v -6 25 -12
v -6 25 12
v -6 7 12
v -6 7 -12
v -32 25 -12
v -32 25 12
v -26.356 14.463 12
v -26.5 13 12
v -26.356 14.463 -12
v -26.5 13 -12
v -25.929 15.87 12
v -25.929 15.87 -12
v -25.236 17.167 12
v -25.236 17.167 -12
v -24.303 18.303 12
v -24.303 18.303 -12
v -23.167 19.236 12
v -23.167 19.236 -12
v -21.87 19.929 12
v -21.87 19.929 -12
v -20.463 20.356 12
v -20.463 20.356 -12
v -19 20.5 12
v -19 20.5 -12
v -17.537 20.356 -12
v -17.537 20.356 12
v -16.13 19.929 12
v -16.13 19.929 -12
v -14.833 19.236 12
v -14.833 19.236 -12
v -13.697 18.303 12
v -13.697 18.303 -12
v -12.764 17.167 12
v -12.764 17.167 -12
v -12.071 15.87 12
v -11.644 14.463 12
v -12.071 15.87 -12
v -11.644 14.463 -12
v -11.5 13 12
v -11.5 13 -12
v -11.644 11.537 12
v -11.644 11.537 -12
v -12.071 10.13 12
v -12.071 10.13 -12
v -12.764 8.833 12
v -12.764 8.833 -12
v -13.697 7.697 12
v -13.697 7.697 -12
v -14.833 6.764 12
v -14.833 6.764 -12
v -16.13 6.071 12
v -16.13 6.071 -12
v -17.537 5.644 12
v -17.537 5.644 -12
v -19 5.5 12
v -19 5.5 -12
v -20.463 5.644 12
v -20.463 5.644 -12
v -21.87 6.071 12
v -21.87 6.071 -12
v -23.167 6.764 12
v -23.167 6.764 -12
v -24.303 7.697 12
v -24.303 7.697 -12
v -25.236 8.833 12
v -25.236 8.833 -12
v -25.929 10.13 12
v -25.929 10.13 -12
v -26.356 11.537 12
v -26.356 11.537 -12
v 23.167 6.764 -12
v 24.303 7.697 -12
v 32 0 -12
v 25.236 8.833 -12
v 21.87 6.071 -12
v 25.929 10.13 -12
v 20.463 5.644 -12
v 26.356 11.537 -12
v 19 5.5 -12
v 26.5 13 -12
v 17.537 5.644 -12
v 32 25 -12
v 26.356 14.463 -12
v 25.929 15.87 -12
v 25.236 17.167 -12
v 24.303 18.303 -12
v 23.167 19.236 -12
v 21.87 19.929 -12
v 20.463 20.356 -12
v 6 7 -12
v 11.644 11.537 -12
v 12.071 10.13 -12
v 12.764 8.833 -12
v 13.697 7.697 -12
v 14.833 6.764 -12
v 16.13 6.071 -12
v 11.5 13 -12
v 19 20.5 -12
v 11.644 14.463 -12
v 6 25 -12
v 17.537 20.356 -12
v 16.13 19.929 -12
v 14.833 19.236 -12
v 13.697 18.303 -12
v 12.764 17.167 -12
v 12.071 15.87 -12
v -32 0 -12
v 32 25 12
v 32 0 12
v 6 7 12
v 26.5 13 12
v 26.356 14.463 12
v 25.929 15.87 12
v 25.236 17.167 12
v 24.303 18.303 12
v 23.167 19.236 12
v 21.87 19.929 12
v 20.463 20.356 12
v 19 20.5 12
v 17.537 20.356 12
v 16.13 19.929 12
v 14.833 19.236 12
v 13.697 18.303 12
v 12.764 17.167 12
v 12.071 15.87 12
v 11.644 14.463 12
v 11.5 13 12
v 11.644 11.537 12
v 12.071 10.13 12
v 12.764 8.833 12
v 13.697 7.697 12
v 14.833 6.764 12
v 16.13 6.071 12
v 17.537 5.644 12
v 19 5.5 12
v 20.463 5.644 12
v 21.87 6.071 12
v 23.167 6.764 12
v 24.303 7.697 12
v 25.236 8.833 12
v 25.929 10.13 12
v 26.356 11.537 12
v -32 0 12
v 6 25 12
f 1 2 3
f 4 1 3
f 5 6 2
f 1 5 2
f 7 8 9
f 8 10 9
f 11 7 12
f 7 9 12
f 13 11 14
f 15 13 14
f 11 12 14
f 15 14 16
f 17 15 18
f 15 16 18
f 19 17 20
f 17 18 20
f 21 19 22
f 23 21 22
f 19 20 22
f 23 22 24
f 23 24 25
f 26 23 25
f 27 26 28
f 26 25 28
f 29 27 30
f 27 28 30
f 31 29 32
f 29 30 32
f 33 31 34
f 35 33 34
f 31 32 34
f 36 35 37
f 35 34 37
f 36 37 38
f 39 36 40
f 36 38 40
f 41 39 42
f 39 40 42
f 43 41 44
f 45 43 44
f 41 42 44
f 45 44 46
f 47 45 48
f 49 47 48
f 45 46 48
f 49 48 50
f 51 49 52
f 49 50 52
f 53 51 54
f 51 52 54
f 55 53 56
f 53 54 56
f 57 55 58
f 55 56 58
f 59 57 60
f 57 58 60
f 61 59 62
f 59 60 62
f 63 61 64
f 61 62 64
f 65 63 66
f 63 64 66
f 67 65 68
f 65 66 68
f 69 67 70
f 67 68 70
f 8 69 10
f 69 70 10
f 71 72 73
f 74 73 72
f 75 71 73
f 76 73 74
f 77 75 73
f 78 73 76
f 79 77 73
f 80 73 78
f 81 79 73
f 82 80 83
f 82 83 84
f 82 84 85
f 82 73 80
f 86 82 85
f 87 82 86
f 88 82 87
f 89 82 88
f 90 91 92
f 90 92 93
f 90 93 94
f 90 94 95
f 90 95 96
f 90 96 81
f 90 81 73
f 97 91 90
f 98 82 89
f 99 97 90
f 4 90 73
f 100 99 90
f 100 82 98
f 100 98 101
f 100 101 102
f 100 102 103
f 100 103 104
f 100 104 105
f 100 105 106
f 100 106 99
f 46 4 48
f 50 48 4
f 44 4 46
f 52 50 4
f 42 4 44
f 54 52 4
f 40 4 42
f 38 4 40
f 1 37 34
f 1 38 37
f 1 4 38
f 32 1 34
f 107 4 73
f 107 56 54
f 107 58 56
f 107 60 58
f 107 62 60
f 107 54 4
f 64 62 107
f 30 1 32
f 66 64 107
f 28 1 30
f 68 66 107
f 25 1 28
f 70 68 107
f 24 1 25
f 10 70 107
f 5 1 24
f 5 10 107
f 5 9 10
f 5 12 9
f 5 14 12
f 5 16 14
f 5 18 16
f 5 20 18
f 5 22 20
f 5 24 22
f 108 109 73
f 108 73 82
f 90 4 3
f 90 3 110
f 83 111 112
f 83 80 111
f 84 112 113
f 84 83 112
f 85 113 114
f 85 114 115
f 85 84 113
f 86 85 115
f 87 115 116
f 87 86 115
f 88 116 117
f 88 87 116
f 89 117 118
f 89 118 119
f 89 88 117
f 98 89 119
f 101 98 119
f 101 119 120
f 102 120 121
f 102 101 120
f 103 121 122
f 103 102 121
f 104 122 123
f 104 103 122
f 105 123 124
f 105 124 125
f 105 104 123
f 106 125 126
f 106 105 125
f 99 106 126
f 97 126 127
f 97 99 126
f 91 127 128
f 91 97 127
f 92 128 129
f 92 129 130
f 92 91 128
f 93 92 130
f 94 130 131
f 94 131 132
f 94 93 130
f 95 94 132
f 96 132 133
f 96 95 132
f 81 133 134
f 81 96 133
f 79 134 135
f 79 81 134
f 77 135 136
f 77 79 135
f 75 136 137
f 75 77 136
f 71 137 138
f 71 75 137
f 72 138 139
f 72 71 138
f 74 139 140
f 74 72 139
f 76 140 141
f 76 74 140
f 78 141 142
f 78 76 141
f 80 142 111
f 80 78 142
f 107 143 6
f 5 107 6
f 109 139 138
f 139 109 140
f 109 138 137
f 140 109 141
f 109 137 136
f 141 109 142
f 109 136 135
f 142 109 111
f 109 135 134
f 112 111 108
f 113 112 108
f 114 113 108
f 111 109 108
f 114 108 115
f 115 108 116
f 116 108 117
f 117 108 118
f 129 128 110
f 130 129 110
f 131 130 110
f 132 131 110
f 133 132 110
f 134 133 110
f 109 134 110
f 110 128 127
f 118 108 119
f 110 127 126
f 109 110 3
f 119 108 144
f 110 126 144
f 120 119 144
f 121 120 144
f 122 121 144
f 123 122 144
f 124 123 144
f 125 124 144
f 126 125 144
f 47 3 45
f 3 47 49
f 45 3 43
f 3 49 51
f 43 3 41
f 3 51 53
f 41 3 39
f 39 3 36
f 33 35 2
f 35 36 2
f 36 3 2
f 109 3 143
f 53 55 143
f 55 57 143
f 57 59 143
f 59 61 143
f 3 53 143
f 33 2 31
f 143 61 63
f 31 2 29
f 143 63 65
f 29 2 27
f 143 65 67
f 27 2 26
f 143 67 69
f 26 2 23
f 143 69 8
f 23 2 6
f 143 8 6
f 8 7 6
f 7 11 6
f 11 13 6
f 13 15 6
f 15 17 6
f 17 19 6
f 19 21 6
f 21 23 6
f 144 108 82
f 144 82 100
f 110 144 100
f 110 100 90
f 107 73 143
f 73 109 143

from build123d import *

# Parameters (mm, degrees)
SKETCH8_R           = 7.5
BOSS_EXTRUDE1_DEPTH = 12


with BuildPart() as part:
    # Sketch8 → Boss-Extrude1 (new, symmetric)
    with BuildSketch(Plane.XY):
        Polygon((0, 0), (32, 0), (32, 25), (6, 25), (6, 7), (0, 7), align=None)
        with Locations((19, 13)):
            Circle(SKETCH8_R, mode=Mode.SUBTRACT)
    boss_extrude1 = extrude(amount=BOSS_EXTRUDE1_DEPTH, both=True)

    # Mirror1: Boss-Extrude1 across plane
    add(boss_extrude1.mirror(Plane(origin=(0, 0, 0), x_dir=(0, 0, 1), z_dir=(1, 0, 0))))


solid = part.part
